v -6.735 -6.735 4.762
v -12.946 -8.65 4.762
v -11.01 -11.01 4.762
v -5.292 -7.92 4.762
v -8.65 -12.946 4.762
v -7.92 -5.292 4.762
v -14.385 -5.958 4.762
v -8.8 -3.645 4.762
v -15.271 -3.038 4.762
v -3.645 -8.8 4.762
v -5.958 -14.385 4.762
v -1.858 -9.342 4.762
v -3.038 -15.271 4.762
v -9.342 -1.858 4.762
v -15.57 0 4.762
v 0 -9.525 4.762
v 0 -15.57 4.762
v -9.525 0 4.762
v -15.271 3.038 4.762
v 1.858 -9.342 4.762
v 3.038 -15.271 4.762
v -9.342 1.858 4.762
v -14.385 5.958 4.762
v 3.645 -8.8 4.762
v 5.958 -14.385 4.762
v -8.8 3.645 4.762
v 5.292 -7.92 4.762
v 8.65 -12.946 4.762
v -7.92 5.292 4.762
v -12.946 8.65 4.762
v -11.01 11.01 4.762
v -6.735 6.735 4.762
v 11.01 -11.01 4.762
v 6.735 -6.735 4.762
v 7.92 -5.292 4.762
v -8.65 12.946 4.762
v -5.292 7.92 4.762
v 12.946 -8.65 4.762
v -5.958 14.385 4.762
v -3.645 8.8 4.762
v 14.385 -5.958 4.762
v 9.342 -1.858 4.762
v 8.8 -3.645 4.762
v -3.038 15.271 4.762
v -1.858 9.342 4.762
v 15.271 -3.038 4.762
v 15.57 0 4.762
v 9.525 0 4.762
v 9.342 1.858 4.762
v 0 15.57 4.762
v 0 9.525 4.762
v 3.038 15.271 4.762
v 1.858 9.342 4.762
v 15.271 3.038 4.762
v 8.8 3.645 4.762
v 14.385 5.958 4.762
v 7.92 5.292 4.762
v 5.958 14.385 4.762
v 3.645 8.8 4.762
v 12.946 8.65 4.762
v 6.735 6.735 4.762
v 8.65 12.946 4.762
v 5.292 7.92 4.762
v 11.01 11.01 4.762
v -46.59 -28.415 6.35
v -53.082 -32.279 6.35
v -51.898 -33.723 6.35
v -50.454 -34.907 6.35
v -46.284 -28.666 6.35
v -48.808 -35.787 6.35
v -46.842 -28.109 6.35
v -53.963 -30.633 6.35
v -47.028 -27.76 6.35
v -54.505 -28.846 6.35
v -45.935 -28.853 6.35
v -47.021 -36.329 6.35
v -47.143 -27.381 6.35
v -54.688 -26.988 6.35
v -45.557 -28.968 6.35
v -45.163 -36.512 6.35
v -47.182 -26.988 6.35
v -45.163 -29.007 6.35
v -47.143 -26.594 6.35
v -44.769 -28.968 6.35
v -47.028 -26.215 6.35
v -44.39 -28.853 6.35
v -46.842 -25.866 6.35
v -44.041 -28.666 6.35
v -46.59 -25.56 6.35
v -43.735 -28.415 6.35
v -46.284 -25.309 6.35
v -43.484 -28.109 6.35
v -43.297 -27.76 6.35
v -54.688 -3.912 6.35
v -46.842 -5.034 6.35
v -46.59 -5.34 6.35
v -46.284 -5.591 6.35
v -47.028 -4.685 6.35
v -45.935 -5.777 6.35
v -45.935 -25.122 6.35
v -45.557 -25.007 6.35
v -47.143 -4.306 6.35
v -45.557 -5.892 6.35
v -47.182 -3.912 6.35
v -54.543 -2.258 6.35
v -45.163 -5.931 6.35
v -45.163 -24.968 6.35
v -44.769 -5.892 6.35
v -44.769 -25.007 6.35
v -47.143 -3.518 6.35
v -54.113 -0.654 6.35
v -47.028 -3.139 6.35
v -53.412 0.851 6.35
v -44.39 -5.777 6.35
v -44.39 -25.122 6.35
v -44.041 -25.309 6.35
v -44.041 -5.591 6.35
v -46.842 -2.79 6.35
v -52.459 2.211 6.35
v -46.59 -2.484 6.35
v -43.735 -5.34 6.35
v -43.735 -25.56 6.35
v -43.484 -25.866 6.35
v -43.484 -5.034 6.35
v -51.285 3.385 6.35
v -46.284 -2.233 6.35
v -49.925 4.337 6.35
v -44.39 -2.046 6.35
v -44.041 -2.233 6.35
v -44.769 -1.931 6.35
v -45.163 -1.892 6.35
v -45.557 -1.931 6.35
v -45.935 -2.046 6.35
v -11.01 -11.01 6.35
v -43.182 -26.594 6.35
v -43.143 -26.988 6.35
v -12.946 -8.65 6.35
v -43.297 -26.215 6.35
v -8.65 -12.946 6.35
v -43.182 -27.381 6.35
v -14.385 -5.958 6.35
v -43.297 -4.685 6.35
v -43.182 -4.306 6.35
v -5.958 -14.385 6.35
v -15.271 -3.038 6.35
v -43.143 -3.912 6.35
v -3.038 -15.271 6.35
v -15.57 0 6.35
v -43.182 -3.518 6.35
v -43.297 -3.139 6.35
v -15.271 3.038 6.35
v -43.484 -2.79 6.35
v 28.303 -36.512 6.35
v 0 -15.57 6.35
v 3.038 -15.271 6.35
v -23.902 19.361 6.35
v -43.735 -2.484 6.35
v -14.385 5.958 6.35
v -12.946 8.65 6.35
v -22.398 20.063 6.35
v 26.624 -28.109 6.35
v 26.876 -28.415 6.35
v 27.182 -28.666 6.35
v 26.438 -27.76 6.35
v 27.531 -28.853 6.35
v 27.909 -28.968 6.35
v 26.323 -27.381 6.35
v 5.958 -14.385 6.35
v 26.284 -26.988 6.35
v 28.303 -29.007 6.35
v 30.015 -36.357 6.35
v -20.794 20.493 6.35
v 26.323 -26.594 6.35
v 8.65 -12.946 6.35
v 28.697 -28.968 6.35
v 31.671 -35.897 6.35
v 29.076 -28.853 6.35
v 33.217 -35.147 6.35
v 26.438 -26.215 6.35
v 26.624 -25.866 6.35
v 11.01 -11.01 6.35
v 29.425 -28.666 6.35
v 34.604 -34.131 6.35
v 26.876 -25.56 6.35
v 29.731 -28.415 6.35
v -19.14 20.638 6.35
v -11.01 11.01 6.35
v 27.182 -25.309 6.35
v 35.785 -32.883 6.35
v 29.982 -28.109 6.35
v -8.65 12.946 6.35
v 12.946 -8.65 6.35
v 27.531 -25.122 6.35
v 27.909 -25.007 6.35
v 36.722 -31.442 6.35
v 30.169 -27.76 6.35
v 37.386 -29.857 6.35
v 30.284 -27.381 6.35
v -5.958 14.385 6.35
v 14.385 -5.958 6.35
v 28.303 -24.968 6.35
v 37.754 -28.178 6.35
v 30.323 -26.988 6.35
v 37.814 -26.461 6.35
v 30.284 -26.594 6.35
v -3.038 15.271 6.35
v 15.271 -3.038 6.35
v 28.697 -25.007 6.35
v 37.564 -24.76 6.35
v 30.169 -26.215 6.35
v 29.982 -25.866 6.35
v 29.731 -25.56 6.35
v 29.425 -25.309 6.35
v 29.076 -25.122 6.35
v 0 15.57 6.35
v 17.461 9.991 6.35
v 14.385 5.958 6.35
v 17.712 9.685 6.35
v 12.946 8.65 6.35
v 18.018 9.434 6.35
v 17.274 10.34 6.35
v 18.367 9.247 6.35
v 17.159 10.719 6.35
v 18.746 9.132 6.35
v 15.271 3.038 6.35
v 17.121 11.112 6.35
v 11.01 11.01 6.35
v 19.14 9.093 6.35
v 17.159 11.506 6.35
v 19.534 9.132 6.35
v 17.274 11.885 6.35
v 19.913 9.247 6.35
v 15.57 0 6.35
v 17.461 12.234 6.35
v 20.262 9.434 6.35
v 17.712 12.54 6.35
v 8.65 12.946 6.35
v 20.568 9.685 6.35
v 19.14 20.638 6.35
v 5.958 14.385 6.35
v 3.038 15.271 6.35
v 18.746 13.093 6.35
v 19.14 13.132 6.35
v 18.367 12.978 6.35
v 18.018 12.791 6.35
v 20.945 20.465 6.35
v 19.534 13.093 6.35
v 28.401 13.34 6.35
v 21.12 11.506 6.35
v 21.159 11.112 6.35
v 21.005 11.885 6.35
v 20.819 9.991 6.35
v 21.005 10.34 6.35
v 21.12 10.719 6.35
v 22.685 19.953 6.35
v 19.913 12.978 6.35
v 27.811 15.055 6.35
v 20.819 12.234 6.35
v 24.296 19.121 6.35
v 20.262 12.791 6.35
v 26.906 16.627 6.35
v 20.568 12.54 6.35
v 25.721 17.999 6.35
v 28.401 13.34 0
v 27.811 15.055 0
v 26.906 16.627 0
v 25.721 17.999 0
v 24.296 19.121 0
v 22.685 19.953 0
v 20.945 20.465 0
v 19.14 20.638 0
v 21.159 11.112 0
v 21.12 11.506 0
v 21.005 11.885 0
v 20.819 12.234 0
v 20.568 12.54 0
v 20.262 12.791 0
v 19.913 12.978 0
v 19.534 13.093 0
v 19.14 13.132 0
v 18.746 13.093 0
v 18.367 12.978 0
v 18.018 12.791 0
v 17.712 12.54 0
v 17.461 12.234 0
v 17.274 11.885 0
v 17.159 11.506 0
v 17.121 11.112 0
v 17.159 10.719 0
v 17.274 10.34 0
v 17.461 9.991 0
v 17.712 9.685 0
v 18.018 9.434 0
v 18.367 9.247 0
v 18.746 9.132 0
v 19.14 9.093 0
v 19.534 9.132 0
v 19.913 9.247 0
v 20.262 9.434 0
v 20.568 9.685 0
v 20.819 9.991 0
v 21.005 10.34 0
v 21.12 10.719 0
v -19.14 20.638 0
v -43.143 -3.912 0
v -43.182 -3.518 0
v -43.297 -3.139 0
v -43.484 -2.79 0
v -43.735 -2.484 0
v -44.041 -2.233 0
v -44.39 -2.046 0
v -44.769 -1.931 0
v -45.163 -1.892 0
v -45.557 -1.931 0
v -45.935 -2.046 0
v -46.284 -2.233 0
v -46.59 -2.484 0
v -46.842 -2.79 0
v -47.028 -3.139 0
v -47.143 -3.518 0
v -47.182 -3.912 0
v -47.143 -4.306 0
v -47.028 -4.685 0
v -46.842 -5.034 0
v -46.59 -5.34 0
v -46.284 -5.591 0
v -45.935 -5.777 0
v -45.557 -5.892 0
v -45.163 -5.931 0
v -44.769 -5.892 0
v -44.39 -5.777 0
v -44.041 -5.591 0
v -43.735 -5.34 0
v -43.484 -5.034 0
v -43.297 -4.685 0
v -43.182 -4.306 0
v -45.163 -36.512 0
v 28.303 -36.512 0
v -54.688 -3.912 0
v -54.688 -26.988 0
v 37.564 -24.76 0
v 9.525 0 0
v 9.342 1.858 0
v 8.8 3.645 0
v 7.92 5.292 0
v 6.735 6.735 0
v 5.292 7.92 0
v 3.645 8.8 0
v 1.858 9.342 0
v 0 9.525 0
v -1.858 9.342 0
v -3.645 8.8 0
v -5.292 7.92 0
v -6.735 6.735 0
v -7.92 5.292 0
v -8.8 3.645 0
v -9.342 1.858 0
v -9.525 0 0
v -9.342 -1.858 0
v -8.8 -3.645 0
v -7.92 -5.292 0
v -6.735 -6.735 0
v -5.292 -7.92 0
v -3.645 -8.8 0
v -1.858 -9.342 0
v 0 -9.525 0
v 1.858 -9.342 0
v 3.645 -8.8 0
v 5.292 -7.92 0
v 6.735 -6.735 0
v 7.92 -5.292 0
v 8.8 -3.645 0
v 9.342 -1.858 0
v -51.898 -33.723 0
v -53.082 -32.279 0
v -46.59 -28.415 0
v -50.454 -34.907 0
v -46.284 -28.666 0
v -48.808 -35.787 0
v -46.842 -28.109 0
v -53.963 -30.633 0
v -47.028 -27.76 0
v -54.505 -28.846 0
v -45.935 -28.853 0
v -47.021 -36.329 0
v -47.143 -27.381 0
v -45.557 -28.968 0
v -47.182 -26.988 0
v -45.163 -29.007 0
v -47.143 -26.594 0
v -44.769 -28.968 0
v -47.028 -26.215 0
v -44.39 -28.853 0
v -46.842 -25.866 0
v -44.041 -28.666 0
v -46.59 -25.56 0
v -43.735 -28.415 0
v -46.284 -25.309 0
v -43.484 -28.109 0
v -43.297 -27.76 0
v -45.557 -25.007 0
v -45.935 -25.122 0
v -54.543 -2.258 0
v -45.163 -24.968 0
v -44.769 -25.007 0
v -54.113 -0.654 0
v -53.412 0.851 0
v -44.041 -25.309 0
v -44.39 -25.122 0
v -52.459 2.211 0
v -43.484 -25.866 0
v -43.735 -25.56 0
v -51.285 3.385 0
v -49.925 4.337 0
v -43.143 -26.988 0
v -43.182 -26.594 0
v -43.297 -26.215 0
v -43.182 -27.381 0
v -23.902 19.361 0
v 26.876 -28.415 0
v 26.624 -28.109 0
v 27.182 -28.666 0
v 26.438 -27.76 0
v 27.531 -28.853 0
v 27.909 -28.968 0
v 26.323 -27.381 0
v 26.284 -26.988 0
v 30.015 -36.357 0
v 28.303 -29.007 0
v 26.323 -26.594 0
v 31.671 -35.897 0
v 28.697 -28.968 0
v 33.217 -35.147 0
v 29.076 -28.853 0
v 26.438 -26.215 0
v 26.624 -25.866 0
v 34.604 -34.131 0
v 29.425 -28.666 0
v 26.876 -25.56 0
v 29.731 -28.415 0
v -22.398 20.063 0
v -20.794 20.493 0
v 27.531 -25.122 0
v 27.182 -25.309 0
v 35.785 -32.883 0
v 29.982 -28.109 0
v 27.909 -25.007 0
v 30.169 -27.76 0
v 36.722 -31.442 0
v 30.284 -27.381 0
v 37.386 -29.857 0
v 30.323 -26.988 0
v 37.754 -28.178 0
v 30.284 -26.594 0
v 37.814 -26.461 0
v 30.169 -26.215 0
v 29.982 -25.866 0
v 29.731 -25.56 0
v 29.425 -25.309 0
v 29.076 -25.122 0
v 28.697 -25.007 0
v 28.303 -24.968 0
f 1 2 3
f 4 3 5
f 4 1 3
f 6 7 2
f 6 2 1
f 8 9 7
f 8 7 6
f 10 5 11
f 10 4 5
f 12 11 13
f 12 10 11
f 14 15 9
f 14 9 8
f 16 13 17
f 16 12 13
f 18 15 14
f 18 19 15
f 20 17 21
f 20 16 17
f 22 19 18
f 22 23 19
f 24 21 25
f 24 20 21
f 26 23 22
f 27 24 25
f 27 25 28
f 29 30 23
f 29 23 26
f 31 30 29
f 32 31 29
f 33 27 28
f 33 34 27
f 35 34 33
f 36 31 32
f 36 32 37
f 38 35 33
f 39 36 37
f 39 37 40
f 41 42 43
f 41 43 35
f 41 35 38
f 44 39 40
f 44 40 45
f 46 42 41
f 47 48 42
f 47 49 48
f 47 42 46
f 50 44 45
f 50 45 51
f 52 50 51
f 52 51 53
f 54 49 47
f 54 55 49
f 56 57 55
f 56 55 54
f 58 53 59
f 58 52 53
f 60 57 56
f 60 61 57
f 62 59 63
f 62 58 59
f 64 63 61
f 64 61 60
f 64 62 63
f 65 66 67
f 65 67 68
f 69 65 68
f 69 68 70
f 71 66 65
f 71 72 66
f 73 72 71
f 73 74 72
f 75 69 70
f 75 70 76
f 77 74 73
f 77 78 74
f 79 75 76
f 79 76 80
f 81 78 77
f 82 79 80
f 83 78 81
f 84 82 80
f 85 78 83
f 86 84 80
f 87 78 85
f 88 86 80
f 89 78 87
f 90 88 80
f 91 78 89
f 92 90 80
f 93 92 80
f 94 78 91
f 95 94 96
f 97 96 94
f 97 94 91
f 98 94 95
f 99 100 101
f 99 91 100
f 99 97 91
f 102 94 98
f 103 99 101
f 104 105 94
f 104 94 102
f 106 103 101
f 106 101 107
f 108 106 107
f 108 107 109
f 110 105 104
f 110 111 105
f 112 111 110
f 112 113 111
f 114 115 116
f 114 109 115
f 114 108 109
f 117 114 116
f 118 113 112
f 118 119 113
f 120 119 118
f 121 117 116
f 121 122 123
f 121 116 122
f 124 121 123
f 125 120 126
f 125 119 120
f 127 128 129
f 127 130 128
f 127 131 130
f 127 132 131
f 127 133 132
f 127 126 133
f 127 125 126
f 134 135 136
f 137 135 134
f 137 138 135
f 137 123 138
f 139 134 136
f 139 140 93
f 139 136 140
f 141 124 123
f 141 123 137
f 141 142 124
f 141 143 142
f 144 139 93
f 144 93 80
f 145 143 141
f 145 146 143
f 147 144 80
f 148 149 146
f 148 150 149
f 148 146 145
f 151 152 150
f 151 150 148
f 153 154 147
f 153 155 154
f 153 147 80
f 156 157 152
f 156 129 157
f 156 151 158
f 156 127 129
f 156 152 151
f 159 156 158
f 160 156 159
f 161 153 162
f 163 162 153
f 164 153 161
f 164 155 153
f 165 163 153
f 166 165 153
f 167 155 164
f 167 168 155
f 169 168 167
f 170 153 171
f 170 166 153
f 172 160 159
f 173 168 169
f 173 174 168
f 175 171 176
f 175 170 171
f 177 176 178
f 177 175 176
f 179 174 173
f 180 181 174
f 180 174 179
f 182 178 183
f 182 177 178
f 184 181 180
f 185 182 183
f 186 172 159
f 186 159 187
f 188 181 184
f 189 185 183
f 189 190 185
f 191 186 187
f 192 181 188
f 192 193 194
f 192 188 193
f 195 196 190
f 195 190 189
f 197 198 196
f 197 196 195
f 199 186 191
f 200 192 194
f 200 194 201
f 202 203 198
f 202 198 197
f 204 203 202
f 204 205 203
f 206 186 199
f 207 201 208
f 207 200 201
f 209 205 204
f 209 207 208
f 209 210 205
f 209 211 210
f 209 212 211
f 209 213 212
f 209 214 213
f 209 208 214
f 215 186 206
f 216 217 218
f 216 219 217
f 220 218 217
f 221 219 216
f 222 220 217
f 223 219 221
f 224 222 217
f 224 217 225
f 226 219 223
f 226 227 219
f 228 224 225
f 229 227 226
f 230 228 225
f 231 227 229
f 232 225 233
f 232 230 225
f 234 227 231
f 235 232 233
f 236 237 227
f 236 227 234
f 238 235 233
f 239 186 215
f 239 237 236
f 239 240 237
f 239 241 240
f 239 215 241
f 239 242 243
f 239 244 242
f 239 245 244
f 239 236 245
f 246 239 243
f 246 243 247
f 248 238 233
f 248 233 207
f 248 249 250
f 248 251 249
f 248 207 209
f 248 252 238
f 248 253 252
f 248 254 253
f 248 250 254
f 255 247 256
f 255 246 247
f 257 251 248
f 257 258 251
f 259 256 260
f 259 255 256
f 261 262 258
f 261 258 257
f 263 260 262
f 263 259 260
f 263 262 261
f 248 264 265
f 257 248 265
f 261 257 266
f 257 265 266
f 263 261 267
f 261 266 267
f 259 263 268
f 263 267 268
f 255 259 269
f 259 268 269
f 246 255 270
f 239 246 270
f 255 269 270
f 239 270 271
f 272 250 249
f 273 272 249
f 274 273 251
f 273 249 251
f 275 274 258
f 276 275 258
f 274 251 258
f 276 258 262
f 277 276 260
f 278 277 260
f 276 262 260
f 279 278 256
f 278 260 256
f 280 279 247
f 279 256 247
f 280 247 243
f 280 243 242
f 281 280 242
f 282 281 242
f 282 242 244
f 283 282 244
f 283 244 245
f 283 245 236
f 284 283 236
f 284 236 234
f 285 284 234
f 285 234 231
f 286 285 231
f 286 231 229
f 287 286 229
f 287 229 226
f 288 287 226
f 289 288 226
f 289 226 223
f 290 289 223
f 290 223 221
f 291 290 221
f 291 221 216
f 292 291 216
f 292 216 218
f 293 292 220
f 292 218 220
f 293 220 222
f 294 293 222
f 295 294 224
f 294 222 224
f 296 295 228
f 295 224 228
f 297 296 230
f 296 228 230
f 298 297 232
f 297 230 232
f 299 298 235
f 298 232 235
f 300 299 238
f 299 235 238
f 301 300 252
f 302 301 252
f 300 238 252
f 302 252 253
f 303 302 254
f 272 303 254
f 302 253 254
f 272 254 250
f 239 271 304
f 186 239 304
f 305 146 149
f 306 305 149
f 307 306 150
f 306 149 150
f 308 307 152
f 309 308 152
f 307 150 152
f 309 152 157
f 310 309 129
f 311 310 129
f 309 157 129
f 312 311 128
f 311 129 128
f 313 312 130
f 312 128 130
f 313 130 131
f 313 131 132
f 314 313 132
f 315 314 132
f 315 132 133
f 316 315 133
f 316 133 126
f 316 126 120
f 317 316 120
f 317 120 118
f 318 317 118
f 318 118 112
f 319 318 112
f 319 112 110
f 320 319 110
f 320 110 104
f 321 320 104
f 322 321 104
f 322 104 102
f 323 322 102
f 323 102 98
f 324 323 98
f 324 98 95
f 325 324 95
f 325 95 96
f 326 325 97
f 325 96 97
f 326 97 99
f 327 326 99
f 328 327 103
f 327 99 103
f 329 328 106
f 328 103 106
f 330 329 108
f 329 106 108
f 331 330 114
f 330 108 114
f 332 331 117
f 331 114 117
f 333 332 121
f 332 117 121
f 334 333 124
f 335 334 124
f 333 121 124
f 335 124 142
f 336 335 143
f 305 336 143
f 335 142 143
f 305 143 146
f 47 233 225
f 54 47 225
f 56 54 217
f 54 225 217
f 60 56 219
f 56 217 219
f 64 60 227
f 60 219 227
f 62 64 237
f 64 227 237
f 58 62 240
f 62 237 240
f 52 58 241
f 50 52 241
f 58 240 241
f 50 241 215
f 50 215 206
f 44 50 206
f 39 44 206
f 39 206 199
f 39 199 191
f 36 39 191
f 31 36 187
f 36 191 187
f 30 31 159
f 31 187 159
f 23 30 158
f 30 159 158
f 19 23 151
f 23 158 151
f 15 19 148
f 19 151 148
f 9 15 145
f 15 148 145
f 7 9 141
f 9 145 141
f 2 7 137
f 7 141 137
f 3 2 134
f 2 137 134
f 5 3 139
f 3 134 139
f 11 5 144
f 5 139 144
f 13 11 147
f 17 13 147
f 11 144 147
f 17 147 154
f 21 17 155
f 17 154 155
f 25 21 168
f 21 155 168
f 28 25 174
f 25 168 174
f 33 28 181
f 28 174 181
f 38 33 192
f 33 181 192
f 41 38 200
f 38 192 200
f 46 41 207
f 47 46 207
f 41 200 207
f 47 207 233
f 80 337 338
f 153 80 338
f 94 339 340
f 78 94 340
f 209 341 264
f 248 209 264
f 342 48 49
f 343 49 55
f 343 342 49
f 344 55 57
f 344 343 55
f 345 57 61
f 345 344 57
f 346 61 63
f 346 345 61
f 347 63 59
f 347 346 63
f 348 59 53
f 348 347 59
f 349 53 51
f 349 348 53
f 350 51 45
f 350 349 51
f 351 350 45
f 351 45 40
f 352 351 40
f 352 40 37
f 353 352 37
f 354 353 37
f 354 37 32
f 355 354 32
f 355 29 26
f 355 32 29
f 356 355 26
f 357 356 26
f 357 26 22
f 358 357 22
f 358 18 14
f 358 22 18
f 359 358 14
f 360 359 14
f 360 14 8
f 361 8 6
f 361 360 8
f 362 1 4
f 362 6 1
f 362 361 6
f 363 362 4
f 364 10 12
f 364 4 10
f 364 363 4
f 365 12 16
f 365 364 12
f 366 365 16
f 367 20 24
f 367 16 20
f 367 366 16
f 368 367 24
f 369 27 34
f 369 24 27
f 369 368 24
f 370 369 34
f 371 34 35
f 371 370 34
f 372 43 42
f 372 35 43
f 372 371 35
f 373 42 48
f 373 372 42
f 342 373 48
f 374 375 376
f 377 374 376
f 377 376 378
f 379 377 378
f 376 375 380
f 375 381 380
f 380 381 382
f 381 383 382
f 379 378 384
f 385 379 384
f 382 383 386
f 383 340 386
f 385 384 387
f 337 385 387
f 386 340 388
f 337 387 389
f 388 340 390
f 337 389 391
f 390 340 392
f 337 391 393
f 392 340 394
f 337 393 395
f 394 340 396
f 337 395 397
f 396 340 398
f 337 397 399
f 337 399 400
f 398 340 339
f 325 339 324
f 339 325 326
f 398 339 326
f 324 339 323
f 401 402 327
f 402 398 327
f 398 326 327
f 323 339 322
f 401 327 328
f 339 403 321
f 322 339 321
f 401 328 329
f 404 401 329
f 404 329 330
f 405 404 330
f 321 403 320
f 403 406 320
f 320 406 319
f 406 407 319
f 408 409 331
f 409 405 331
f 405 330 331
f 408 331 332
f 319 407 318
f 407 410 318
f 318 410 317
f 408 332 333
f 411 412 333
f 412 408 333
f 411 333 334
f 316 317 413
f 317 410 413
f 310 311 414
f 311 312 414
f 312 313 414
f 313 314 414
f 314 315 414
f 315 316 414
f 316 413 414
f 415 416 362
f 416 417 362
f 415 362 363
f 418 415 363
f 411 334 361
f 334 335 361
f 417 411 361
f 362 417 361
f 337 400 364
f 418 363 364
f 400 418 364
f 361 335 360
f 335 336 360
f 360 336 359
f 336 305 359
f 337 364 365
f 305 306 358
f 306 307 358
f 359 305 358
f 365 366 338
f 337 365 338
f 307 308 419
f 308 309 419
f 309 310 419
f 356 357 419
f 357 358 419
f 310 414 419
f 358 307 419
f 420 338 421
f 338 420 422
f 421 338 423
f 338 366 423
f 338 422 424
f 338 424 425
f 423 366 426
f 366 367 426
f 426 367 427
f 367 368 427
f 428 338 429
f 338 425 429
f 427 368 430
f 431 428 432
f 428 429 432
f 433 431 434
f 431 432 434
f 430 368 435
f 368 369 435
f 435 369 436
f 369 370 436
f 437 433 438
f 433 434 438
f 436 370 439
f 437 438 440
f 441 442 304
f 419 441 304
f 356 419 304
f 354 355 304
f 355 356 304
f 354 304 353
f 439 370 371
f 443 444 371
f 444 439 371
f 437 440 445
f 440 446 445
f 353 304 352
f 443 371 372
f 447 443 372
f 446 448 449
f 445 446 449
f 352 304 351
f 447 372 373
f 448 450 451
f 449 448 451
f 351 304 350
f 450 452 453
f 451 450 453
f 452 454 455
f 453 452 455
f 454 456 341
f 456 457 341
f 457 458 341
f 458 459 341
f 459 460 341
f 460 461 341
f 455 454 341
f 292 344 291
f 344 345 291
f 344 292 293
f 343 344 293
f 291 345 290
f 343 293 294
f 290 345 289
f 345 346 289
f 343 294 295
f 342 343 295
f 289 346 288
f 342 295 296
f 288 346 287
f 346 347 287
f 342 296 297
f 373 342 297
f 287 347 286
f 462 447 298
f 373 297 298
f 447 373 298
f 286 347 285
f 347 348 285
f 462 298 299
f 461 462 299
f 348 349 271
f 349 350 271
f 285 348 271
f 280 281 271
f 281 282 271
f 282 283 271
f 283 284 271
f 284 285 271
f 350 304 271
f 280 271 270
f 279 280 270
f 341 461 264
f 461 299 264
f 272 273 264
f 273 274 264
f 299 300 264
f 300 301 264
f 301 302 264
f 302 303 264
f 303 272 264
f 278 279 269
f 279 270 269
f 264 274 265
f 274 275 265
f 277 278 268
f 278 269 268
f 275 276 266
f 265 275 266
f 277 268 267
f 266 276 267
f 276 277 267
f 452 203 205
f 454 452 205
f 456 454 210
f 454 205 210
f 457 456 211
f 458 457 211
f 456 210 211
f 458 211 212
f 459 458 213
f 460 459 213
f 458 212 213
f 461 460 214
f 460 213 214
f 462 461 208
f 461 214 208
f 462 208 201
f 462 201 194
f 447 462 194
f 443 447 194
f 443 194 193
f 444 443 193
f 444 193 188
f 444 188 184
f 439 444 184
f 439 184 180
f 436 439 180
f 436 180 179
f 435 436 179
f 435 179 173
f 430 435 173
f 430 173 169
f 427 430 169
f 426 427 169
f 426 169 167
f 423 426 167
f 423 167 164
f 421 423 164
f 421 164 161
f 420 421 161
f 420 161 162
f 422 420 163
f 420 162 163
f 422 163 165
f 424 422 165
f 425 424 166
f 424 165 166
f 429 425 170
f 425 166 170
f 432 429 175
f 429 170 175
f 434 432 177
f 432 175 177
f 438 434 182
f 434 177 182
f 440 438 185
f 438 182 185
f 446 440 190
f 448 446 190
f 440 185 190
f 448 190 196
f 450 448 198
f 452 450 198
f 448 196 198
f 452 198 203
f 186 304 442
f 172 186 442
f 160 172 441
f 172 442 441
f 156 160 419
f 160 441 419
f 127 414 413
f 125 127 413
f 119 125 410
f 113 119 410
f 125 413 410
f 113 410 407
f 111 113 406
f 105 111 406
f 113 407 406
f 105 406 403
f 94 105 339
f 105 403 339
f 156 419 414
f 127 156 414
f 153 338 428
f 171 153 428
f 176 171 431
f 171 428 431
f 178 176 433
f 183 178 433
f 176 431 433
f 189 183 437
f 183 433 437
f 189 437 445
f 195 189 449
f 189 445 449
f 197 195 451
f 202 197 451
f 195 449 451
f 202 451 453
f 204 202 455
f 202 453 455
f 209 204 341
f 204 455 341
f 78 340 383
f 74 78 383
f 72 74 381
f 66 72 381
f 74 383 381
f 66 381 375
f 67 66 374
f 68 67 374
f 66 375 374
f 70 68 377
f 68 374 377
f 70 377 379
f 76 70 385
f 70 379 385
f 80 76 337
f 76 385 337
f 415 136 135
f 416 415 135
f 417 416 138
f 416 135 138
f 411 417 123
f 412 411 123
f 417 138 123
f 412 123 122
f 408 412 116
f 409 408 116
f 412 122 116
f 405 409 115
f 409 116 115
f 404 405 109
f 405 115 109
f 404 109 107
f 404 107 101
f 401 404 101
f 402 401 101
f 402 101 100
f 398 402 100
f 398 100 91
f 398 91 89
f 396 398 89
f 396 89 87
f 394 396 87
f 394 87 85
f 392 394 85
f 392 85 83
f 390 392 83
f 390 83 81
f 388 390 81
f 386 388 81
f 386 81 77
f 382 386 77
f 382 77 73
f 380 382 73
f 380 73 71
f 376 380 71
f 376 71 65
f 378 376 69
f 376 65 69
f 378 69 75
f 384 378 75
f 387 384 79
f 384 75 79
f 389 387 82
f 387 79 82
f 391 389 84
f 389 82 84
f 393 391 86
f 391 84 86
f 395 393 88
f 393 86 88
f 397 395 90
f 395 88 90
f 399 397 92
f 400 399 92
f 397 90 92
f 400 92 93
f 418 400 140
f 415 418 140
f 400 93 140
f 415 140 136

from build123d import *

# Parameters (mm, degrees)
SKETCH1_R                  = 9.525
BOSS_EXTRUDE1_DEPTH        = 6.35
SKETCH6_R                  = 15.5702
CUT_EXTRUDE2_DEPTH         = 1.5875
TAP_DRILL_FOR_10_32_TAP1_D = 4.0386


with BuildPart() as part:
    # Sketch1 → Boss-Extrude1 (new body)
    with BuildSketch(Plane.XY):
        with BuildLine():
            Line((-45.162617117, -36.5125), (28.303378868, -36.5125))
            ThreePointArc((28.303378868, -36.5125), (35.784732944, -32.882834273), (37.564288704, -24.760130697))
            Line((37.564288704, -24.760130697), (28.400743011, 13.339869303))
            ThreePointArc((28.400743011, 13.339869303), (25.035167449, 18.593854076), (19.139833175, 20.6375))
            Line((19.139833175, 20.6375), (-19.139833175, 20.6375))
            ThreePointArc((-19.139833175, 20.6375), (-21.60508458, 20.312943495), (-23.902333175, 19.361391971))
            Line((-23.902333175, 19.361391971), (-49.925117117, 4.337130657))
            ThreePointArc((-49.925117117, 4.337130657), (-53.411509088, 0.850738686), (-54.687617117, -3.911761314))
            Line((-54.687617117, -3.911761314), (-54.687617117, -26.9875))
            ThreePointArc((-54.687617117, -26.9875), (-51.897809208, -33.722692091), (-45.162617117, -36.5125))
        make_face()
        Circle(SKETCH1_R, mode=Mode.SUBTRACT)
    extrude(amount=BOSS_EXTRUDE1_DEPTH)

    # Sketch6 → Cut-Extrude2 (cut)
    with BuildSketch(Plane.XY.offset(6.35)):
        Circle(SKETCH6_R)
    extrude(amount=-CUT_EXTRUDE2_DEPTH, mode=Mode.SUBTRACT)

    # Tap Drill for #10-32 Tap1 (through all)
    with Locations(Plane(origin=(0, 0, 0), x_dir=(-1, 0, 0), z_dir=(0, 0, -1))):
        with Locations((-28.303378868, -26.9875), (-19.139833175, 11.1125), (45.162617117, -3.911761314), (45.162617117, -26.9875)):
            Hole(TAP_DRILL_FOR_10_32_TAP1_D / 2)


solid = part.part
